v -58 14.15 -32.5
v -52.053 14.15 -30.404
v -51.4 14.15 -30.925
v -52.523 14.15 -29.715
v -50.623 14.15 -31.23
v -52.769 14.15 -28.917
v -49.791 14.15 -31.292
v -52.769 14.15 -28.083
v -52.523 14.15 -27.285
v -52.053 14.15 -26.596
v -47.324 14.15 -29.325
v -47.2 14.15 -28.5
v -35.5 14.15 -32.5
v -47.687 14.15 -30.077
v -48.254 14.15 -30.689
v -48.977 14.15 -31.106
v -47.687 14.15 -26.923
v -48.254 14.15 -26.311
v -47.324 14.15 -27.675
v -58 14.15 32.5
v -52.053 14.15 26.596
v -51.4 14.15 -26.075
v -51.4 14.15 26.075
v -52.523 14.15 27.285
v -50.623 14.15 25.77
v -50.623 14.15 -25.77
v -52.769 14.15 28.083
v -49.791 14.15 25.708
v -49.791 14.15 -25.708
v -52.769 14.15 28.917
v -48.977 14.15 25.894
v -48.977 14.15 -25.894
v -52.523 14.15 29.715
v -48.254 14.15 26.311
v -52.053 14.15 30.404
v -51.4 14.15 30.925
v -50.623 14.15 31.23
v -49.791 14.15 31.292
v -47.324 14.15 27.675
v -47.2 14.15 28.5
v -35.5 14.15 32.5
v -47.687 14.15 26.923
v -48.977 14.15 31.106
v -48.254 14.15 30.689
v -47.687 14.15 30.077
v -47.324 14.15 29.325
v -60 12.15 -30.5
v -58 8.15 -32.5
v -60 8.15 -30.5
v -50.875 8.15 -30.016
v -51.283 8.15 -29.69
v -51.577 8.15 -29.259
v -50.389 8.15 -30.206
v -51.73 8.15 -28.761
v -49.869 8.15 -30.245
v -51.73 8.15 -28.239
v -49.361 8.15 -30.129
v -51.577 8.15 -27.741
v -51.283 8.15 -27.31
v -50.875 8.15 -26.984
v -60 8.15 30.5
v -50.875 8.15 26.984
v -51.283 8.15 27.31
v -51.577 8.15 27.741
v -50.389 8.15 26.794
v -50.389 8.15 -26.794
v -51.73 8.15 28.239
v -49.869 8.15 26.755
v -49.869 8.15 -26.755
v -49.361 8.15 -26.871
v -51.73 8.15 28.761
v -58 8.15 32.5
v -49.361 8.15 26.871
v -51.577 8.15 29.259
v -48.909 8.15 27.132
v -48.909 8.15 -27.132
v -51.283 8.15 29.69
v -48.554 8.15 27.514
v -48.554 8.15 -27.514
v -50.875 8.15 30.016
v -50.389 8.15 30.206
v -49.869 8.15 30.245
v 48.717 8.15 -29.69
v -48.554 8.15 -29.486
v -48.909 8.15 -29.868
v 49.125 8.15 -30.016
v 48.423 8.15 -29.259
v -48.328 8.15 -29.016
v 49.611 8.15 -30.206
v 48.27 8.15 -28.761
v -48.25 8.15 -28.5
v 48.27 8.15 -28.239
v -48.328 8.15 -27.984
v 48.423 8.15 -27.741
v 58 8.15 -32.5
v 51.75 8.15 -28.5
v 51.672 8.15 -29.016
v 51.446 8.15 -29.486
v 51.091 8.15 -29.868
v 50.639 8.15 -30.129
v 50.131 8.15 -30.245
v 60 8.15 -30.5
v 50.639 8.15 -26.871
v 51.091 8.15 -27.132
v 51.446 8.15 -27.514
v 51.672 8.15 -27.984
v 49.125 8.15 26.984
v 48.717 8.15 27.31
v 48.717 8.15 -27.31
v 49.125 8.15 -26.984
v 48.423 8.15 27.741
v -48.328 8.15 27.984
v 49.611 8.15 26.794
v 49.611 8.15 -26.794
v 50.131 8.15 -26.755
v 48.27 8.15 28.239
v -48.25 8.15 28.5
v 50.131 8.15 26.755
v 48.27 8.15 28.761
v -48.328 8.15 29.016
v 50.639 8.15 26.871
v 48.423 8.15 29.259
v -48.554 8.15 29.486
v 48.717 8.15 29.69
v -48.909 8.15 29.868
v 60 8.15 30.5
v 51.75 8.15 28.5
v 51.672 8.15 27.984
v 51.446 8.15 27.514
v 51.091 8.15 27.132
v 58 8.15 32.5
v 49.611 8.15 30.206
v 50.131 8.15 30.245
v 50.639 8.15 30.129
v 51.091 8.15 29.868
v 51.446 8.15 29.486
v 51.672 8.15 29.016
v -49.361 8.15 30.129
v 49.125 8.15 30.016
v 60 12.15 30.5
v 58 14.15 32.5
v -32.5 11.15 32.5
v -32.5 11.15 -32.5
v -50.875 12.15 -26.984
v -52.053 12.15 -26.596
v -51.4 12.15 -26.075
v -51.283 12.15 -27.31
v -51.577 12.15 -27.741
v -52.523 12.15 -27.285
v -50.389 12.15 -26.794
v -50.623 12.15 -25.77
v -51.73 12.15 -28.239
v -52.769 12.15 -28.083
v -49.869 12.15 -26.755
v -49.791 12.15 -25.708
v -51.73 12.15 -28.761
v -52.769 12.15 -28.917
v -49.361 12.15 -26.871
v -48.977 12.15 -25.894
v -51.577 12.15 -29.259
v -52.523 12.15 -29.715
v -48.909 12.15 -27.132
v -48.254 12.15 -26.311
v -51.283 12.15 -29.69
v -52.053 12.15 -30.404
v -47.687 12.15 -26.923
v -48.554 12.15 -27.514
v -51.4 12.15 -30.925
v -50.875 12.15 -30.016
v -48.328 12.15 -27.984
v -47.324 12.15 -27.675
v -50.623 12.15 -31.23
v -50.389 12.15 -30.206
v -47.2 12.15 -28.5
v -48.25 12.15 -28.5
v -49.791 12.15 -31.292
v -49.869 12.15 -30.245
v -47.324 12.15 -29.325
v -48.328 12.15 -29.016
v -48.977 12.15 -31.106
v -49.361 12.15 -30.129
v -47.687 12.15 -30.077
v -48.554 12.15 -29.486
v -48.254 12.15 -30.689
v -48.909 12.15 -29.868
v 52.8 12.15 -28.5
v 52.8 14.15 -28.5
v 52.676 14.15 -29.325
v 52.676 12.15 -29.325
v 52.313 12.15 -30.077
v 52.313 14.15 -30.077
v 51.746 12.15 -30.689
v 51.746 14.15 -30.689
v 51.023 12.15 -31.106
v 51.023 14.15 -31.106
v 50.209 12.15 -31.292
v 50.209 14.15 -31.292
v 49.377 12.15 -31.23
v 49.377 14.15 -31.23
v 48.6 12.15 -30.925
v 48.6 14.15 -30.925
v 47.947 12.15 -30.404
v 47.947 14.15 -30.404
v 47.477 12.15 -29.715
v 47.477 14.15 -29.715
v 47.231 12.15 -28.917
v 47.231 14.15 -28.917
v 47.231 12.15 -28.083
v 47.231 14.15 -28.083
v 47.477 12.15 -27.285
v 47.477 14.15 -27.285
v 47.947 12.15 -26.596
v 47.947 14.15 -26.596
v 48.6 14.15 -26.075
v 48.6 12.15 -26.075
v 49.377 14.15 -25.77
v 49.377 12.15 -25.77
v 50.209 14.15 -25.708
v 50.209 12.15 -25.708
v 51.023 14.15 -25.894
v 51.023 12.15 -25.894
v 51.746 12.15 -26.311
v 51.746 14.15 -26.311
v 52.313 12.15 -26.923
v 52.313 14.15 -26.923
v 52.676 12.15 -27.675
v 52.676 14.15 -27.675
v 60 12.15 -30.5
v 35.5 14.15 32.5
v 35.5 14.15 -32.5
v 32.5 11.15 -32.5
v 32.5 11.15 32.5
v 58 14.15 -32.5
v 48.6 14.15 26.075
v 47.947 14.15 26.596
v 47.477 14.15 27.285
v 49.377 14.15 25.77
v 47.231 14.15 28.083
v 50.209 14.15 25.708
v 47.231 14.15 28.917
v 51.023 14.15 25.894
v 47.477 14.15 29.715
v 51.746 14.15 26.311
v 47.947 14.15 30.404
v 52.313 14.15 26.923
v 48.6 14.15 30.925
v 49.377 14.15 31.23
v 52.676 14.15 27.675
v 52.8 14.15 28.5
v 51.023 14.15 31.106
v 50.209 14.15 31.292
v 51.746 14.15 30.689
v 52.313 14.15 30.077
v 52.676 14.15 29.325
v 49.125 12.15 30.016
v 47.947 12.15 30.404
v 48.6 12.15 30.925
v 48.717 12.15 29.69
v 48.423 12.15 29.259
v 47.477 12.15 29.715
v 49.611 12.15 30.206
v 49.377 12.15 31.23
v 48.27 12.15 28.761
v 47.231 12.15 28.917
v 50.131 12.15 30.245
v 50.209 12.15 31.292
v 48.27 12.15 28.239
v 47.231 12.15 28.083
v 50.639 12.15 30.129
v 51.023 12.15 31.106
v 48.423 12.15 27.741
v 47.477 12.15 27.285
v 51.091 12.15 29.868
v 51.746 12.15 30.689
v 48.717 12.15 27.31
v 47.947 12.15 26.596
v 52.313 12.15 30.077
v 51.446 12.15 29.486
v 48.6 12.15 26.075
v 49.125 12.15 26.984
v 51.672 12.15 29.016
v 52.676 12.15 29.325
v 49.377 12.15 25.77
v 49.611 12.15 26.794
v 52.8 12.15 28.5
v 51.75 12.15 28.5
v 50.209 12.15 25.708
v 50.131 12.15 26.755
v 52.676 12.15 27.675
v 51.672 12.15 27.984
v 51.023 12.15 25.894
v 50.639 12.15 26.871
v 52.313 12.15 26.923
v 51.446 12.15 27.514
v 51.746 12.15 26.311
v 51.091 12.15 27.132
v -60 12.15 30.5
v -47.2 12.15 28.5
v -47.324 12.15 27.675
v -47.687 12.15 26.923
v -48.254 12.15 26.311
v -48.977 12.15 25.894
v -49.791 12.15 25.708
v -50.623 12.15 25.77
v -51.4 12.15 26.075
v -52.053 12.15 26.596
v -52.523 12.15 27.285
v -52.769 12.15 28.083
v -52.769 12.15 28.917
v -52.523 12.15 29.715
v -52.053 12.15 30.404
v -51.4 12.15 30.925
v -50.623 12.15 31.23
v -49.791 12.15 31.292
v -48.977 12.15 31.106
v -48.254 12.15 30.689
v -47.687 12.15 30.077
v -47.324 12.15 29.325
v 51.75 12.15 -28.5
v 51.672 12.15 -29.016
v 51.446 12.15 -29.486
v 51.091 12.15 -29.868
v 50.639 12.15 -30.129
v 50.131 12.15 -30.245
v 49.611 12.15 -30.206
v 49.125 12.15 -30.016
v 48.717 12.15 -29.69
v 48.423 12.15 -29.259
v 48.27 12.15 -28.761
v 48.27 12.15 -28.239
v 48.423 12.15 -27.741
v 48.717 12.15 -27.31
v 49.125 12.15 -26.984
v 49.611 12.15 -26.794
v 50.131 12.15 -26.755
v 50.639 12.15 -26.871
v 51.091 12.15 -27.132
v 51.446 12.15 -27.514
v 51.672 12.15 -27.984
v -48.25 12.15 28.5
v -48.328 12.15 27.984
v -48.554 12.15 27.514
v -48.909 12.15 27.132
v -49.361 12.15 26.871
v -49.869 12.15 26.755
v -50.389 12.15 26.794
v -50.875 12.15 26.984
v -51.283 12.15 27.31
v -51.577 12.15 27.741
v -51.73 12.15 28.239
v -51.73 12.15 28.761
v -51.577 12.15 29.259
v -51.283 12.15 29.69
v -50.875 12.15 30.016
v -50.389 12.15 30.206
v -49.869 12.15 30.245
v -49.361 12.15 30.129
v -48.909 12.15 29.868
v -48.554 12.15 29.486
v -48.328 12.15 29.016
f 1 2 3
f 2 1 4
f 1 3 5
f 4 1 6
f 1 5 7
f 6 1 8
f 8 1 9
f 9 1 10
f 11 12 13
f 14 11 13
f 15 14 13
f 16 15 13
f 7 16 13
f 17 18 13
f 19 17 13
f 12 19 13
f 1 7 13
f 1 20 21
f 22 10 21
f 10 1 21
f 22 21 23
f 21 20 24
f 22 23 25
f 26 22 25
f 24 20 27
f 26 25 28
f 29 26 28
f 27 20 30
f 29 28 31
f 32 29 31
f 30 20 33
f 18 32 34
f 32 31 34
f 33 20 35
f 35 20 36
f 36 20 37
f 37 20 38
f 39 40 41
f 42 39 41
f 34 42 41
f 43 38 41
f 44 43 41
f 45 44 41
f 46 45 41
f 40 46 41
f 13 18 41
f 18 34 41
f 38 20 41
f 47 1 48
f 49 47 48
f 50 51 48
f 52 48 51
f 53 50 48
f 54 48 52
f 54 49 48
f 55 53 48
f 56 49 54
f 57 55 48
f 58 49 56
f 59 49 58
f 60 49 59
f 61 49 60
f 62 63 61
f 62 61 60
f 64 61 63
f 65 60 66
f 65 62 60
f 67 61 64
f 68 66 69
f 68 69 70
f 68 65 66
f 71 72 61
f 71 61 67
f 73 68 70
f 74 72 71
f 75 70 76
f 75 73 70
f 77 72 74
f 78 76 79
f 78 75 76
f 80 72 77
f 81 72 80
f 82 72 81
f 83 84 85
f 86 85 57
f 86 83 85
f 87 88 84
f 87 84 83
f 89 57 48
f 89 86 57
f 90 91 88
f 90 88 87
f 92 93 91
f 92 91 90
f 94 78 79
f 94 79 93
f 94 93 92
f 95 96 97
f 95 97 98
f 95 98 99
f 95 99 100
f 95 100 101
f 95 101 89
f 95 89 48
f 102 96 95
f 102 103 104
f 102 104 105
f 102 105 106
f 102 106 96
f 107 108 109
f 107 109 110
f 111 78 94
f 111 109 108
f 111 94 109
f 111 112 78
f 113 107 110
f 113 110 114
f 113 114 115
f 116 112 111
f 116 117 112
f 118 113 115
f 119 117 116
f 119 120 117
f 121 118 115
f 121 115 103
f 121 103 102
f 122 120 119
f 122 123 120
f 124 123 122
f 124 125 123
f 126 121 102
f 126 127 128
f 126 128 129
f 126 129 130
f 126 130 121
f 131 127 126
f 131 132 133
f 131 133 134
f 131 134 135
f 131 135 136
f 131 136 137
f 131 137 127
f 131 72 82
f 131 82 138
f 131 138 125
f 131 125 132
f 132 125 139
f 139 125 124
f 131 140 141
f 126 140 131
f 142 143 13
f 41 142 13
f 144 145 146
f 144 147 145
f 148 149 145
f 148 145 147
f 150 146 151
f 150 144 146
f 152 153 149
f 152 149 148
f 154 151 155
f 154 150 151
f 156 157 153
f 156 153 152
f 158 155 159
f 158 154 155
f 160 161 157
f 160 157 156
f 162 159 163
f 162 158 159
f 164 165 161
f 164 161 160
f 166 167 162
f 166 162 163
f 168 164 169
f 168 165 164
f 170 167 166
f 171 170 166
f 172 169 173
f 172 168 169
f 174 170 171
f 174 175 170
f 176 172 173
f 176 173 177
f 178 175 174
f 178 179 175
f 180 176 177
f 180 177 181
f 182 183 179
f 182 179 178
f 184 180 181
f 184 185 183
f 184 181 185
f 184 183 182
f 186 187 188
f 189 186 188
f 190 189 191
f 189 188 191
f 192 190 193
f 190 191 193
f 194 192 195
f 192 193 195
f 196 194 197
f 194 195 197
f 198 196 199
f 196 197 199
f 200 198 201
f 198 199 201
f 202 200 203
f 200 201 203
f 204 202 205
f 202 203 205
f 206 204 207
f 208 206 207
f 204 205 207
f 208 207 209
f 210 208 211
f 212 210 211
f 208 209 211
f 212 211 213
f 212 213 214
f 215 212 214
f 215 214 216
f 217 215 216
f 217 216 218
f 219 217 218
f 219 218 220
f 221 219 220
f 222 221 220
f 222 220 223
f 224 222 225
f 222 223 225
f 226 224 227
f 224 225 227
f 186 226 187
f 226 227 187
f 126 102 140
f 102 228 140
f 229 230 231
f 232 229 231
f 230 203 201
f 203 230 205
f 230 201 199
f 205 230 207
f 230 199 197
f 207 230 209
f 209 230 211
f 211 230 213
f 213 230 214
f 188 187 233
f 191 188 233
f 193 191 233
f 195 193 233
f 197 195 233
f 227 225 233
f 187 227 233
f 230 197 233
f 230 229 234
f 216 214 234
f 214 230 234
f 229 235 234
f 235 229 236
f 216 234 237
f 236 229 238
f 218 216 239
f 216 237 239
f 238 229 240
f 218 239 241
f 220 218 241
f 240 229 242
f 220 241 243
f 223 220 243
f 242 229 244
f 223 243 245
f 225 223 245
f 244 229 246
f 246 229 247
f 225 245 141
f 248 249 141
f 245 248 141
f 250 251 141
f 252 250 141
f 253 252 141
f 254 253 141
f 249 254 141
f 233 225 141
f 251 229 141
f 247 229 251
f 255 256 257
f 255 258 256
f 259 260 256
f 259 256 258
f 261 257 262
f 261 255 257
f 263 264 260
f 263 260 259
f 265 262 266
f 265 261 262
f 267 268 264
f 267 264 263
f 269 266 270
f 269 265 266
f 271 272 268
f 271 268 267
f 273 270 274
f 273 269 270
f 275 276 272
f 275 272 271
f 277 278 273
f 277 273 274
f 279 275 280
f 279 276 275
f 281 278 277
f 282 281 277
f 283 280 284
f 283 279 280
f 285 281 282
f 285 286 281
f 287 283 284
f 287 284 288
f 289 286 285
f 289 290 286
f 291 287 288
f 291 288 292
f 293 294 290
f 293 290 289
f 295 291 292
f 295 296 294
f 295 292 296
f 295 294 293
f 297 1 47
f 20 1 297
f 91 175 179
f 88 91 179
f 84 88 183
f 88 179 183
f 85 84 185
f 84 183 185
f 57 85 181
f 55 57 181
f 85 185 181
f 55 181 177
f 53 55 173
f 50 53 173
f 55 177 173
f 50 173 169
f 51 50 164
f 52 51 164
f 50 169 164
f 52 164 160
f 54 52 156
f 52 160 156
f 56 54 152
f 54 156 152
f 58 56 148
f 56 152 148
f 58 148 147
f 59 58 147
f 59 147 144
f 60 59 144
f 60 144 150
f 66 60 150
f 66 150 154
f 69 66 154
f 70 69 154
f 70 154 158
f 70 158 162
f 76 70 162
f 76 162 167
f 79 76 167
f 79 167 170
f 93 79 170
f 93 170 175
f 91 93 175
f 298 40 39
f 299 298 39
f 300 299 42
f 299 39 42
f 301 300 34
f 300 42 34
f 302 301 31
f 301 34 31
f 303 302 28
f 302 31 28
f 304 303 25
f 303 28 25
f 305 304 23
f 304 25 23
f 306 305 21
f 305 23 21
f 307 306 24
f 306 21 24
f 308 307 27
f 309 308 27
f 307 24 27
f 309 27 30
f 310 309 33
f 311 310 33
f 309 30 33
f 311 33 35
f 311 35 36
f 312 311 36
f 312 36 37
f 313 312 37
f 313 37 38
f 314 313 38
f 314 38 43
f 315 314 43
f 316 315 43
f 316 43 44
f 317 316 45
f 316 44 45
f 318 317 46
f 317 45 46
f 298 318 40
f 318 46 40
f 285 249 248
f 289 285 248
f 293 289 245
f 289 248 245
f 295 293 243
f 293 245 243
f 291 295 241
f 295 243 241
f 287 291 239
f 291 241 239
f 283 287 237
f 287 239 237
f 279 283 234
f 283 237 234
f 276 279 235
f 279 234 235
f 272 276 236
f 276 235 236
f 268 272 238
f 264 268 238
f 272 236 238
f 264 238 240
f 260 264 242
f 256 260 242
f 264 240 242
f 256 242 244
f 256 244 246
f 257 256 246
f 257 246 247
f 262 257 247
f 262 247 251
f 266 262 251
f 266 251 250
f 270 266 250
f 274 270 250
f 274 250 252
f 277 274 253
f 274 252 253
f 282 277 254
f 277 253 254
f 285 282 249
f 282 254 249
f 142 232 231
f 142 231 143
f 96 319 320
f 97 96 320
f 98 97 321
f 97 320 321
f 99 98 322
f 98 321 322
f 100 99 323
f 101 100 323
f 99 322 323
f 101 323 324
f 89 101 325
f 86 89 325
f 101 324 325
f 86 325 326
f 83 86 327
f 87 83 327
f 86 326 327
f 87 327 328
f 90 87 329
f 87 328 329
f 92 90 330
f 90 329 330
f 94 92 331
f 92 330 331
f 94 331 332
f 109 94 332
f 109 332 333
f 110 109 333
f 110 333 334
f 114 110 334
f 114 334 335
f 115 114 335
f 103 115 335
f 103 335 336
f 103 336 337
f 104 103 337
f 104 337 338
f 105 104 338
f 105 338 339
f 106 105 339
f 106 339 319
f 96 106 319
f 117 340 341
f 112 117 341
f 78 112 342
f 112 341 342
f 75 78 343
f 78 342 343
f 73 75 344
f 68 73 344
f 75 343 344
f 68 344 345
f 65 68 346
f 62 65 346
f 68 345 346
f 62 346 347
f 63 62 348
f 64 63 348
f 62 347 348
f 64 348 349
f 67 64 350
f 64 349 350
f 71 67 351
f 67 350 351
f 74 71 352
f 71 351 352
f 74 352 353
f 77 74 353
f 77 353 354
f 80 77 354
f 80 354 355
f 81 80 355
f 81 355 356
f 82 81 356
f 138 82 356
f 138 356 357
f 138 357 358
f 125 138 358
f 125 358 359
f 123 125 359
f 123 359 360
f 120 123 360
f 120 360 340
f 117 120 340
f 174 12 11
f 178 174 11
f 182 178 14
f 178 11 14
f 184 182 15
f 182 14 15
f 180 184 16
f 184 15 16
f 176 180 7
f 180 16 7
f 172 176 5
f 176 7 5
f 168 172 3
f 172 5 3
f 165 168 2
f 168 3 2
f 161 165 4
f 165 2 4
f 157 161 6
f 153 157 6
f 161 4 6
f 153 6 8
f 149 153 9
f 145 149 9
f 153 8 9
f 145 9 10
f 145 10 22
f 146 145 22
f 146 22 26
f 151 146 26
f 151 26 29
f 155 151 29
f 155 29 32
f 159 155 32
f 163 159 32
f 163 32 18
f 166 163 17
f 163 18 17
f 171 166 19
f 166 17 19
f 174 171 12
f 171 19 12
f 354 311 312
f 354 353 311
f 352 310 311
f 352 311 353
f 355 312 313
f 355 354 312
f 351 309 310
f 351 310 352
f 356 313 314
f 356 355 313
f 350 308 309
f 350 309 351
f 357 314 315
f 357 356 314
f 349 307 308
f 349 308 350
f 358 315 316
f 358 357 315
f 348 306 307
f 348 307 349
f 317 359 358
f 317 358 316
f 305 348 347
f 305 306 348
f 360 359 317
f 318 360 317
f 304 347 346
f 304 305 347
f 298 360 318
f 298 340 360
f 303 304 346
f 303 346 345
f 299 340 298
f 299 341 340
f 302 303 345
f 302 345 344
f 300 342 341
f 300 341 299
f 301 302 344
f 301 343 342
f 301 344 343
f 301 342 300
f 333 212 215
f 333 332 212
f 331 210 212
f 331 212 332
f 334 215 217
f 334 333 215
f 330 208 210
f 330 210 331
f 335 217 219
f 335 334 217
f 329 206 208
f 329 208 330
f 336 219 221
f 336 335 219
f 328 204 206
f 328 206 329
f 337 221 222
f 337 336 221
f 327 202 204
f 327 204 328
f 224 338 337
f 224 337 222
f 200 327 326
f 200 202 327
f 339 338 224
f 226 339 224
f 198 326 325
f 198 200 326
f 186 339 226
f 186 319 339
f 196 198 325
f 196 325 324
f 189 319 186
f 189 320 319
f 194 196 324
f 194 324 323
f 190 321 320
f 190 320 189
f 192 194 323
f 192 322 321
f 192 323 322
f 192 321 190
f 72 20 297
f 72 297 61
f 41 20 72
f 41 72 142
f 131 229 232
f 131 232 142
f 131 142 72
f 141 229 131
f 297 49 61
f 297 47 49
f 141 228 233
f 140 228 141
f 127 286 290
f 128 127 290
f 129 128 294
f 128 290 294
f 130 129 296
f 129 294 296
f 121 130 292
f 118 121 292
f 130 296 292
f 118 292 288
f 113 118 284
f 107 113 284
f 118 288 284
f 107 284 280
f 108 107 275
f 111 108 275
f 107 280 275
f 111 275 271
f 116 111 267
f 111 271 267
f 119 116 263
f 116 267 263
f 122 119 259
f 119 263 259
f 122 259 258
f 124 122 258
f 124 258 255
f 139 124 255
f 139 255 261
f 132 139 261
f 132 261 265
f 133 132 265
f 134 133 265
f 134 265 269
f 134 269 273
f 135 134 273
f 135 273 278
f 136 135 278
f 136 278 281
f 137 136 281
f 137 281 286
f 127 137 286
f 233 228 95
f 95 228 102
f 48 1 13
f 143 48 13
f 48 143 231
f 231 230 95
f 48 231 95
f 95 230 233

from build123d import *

# Parameters (mm, degrees)
SKETCH_W        = 120
SKETCH_H        = 65
PAD007_DEPTH    = 6
POCKET_DEPTH    = 65.001
CHAMFER009_SIZE = 2
SKETCH055_R     = 1.75
POCKET040_DEPTH = 6.001
SKETCH059_R     = 2.8
POCKET041_DEPTH = 2


with BuildPart() as part:
    # Sketch → Pad007 (new body)
    with BuildSketch(Plane.XZ):
        Rectangle(SKETCH_W, SKETCH_H)
    extrude(amount=PAD007_DEPTH)

    # Sketch054 (on Face1 of Pad007) → Pocket (cut, through all)
    with BuildSketch(Plane(origin=(0, 0, 32.5), x_dir=(-1, 0, 0), z_dir=(0, 0, 1))):
        Polygon((-73.60865, -3.669498), (-50.80994, -15.077229), (-50.577229, -15.077229), (-32.5, 3), (32.5, 3), (50.577229, -15.077229), (50.80994, -15.077229), (73.60865, -3.669498), (73.60865, -24.458851), (-87.275108, -33.737259), align=None)
    extrude(amount=-POCKET_DEPTH, mode=Mode.SUBTRACT)

    # Chamfer009
    chamfer009_edges = [part.edges().sort_by_distance(p)[0] for p in [
        (60, -3, -32.5),
        (60, -3, 32.5),
        (60, 0, 0),
        (-60, -3, -32.5),
        (-60, 0, 0),
        (-60, -3, 32.5),
    ]]
    chamfer(chamfer009_edges, length=CHAMFER009_SIZE)

    # Sketch055 → Pocket040 (cut, through all)
    with BuildSketch(Plane(origin=(0, 0, 0), x_dir=(1, 0, 0), z_dir=(0, 1, 0))):
        with Locations((-50, 28.5)):
            Circle(SKETCH055_R)
        with Locations((-50, -28.5)):
            Circle(SKETCH055_R)
        with Locations((50, 28.5)):
            Circle(SKETCH055_R)
        with Locations((50, -28.5)):
            Circle(SKETCH055_R)
    extrude(amount=-POCKET040_DEPTH, mode=Mode.SUBTRACT)

    # Sketch059 (on Face2 of Pocket040) → Pocket041 (cut)
    with BuildSketch(Plane(origin=(0, 0, 0), x_dir=(1, 0, 0), z_dir=(0, 1, 0))):
        with Locations((-50, 28.5)):
            Circle(SKETCH059_R)
        with Locations((-50, -28.5)):
            Circle(SKETCH059_R)
        with Locations((50, 28.5)):
            Circle(SKETCH059_R)
        with Locations((50, -28.5)):
            Circle(SKETCH059_R)
    extrude(amount=-POCKET041_DEPTH, mode=Mode.SUBTRACT)


with BuildPart() as part_1:
    # Body003 placement: moved
    add(part.part.moved(Location((0, 14.15, 0))))


solid = part_1.part
